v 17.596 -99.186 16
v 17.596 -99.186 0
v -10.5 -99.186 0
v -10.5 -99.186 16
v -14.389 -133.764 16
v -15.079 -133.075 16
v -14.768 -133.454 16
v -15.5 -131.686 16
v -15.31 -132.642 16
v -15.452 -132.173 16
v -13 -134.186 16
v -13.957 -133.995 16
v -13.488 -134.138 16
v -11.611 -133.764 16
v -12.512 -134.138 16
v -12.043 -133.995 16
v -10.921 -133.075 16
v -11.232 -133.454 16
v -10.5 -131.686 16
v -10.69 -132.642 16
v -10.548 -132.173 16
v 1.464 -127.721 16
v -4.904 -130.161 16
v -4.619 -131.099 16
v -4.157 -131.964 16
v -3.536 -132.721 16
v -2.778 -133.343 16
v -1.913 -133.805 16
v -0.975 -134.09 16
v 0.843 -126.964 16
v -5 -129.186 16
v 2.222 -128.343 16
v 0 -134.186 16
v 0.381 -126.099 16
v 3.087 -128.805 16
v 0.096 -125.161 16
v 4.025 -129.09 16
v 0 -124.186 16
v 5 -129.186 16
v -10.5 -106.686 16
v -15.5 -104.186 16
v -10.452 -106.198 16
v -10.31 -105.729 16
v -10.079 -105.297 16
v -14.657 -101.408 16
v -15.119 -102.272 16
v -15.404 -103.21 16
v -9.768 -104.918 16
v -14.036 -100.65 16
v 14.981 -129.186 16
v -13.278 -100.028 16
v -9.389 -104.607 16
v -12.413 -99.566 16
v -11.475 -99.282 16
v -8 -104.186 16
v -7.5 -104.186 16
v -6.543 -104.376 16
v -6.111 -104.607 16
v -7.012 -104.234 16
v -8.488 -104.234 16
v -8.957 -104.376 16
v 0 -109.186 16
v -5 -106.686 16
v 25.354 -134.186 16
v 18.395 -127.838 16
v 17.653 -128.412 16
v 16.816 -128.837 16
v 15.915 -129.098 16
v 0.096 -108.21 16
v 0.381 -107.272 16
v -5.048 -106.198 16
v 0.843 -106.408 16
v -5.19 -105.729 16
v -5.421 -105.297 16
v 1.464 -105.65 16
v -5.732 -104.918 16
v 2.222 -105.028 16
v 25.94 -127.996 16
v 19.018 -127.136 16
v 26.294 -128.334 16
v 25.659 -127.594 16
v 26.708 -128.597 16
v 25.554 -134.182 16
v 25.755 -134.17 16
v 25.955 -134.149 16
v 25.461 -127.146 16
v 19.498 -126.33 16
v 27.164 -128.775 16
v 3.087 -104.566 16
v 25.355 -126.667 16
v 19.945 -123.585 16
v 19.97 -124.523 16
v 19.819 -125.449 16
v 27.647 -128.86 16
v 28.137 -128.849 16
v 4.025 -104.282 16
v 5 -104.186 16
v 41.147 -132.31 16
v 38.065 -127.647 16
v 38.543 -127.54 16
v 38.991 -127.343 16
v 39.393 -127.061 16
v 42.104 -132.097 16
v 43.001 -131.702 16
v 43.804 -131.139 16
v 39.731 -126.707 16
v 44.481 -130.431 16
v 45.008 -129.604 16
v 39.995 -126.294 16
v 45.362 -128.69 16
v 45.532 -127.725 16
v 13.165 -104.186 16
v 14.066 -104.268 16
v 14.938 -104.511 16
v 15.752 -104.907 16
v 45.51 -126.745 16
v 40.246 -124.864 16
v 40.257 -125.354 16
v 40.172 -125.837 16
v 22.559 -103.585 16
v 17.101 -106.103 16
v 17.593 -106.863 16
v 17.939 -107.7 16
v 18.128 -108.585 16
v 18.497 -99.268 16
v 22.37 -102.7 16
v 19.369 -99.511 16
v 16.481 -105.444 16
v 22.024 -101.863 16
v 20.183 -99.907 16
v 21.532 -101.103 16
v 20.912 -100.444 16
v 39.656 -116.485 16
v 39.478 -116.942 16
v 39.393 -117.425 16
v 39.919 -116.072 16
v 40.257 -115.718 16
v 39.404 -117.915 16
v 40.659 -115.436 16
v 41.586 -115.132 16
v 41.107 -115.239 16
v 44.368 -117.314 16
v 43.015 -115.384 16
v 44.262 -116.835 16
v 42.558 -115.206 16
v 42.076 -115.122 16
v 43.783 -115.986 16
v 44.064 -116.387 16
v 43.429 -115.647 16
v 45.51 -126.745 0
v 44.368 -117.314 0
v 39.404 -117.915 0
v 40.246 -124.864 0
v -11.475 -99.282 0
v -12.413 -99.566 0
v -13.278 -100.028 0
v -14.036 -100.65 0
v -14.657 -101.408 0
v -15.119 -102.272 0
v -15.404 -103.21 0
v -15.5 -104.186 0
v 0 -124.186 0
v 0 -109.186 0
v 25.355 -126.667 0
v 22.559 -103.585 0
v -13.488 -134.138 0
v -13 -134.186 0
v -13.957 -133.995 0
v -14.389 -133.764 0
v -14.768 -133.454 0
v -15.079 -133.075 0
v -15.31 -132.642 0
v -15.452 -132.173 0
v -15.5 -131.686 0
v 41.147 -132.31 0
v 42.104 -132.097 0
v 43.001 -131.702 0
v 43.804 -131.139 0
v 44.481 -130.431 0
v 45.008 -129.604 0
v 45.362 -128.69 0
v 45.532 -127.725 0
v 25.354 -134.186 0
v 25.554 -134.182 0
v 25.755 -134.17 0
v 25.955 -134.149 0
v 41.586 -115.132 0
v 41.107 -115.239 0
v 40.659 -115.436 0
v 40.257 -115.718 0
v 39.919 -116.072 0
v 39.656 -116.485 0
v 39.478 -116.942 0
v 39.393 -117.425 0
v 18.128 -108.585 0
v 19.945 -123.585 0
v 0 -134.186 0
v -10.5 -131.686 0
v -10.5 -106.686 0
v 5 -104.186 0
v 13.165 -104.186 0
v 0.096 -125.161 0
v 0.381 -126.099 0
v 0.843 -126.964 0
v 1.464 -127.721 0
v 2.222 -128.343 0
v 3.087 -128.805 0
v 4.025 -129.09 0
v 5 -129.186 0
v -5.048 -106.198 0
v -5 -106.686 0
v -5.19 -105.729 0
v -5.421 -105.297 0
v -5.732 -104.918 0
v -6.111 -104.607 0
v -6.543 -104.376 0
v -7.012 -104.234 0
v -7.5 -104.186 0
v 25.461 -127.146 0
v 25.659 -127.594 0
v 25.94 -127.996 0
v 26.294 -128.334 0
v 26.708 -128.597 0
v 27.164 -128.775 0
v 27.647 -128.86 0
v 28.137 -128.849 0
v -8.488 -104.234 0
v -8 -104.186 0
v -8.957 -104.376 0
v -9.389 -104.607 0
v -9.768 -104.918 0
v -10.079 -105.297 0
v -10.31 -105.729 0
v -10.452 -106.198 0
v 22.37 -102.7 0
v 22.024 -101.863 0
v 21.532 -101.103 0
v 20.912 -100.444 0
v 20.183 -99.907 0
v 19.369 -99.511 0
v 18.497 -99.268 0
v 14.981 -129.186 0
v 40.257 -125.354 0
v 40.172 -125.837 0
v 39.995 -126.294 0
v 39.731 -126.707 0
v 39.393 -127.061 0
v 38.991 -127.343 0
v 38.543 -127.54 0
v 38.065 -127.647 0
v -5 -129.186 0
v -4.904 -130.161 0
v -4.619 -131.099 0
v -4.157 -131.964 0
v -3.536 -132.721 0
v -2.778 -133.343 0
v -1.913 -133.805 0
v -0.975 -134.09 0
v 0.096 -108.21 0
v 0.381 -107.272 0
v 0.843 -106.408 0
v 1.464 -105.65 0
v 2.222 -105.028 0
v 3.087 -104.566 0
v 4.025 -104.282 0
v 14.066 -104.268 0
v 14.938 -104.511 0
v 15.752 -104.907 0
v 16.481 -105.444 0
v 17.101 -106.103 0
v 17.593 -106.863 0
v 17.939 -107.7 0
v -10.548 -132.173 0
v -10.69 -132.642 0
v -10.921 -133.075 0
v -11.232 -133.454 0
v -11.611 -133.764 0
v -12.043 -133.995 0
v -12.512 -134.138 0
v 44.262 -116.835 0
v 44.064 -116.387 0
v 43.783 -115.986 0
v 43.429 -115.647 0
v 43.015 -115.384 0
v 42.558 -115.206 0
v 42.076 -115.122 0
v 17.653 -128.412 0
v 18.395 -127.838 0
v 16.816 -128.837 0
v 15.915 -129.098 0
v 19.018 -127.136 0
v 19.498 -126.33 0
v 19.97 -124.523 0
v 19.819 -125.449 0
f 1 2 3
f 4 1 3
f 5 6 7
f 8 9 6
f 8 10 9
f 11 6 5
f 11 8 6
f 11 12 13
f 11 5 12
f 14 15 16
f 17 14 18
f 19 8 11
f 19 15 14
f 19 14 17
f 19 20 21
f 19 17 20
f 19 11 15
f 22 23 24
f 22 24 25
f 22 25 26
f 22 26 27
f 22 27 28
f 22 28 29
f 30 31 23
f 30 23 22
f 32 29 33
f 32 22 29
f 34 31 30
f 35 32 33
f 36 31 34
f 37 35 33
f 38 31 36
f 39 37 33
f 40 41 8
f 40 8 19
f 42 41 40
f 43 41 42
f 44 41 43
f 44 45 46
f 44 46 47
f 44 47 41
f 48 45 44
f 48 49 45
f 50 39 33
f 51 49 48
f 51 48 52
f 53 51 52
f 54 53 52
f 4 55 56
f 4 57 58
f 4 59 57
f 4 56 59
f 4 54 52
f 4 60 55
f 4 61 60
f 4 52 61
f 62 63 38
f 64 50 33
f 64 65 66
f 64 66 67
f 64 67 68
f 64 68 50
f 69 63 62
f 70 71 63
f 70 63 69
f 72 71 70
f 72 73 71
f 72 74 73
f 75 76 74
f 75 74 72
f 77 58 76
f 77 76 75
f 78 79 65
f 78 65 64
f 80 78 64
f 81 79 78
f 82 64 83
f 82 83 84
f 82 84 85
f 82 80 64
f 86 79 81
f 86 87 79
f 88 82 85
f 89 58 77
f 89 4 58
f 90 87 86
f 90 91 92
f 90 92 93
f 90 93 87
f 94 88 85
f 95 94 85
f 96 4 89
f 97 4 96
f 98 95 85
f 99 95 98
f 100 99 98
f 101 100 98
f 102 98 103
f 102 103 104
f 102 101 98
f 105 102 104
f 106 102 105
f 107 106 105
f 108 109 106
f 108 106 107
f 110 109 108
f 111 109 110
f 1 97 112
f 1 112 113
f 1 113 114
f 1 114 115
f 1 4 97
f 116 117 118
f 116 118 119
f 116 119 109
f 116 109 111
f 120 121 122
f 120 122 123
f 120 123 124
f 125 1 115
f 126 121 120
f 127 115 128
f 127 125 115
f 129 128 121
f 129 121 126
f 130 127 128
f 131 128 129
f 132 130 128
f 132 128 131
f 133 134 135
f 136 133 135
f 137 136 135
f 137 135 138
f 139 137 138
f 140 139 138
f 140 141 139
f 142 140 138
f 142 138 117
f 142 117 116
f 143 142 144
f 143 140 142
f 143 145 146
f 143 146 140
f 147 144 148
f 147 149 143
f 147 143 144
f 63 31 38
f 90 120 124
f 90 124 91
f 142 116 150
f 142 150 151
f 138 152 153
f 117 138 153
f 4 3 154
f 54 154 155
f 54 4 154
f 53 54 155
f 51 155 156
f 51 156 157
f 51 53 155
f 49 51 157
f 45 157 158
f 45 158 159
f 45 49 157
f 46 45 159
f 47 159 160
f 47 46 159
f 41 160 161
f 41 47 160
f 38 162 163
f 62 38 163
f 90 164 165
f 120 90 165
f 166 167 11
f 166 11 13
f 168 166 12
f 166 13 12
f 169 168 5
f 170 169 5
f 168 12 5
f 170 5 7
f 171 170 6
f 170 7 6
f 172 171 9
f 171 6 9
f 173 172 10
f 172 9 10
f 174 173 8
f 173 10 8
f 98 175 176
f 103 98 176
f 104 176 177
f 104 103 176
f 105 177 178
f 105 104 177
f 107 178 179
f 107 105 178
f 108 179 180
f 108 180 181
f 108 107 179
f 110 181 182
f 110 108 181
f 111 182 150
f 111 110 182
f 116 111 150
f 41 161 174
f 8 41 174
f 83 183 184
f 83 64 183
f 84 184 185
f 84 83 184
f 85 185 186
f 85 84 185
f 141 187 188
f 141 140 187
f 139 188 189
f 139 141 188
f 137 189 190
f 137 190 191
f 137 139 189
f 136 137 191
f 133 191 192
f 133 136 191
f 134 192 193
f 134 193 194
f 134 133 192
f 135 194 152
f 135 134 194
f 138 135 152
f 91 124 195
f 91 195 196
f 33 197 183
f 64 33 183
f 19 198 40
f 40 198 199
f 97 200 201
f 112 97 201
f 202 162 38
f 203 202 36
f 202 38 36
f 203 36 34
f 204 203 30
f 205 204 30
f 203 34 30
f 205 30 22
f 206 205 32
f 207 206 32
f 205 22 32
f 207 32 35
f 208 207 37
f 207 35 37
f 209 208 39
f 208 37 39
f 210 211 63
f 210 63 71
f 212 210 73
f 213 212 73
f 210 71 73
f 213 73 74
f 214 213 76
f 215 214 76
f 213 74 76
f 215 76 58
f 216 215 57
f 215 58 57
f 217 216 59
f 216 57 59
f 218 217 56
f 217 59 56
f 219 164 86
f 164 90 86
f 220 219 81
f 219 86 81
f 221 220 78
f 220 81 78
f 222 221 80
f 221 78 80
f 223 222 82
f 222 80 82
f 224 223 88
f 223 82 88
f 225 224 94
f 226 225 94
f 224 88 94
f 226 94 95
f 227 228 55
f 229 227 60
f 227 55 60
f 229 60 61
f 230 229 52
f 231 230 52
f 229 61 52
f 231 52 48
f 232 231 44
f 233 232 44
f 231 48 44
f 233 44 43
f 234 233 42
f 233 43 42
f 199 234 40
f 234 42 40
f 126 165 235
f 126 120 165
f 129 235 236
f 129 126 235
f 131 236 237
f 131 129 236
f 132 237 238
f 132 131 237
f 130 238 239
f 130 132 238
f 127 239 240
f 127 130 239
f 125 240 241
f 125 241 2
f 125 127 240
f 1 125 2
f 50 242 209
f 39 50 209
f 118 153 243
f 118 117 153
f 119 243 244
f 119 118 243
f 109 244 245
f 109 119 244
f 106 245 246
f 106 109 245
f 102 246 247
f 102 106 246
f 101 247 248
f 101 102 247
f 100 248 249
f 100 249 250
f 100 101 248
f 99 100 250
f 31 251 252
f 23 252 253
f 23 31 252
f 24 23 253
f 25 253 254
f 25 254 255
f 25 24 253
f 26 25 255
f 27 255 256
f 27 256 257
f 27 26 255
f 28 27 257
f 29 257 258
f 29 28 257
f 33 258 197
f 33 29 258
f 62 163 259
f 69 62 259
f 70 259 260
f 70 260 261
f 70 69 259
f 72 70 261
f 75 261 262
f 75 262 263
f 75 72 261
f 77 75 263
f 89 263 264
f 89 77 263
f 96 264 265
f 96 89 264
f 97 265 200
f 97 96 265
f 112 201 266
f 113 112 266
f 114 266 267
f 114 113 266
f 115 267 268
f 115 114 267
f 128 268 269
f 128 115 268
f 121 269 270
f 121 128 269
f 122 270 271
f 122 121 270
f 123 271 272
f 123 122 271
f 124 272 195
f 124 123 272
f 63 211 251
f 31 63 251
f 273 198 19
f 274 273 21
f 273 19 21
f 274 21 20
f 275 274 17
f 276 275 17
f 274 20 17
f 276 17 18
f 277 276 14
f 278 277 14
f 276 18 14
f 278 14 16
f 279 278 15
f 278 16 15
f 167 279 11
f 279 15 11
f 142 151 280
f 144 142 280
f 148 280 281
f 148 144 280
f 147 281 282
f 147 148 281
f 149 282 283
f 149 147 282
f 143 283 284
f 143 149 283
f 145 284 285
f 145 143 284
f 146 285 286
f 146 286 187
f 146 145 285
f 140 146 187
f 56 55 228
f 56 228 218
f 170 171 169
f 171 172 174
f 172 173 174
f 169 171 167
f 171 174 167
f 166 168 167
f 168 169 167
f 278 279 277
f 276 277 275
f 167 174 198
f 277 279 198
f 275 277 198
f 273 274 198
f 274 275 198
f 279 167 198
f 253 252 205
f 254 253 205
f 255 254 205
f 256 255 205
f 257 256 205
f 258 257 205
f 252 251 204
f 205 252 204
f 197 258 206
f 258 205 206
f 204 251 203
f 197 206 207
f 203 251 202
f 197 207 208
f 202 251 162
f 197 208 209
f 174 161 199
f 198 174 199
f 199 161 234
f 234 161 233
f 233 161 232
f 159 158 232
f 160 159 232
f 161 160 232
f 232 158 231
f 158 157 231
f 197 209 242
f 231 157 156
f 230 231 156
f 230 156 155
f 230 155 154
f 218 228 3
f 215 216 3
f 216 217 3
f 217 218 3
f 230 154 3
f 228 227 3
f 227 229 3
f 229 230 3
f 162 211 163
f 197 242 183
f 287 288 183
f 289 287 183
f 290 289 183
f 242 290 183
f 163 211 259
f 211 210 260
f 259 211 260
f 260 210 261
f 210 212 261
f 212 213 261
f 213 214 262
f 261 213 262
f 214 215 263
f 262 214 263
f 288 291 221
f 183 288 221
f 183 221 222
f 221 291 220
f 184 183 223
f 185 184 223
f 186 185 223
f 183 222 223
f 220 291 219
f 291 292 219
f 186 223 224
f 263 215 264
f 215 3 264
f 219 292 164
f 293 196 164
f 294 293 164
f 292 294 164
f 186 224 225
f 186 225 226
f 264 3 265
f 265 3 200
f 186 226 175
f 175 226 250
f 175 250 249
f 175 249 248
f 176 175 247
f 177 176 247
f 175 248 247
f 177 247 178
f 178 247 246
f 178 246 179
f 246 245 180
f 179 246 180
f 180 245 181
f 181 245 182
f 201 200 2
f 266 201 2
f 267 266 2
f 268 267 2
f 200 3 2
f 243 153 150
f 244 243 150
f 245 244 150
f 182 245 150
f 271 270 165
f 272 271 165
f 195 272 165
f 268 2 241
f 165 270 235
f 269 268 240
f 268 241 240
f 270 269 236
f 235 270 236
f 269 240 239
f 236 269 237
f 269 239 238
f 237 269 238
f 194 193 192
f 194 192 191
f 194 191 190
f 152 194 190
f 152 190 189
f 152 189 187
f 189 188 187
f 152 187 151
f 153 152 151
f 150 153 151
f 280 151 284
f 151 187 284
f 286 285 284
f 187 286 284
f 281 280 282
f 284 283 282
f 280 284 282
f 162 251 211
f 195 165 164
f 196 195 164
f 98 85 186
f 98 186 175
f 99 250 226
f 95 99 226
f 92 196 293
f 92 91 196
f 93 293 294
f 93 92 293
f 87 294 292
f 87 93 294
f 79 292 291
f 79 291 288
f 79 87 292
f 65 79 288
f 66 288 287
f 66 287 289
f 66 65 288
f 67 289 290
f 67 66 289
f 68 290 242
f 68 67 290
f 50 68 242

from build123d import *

# Parameters (mm, degrees)
F0_W     = 5
F0_H     = 30
F1_DEPTH = 16
F2_R     = 5
F3_R     = 2.49999


# Not quite as in the source:
# - a fillet or chamfer is up to 0.001 mm smaller than in the source, because OpenCascade refuses the exact size
# - a feature names something its author has since deleted; it is built from what else it names


with BuildPart() as f1:
    # F0 (on Top) → F1 (new body)
    with BuildSketch(Plane.XY):
        with Locations((-13, -119.1857503612)):
            Rectangle(F0_W, F0_H)
        Polygon((-15.5, -99.1857503612), (-15.5, -104.1857503612), (-10.5, -104.1857503612), (-5, -104.1857503612), (0, -104.1857503612), (0, -99.1857503612), align=None)
        Polygon((0, -104.1857503612), (-5, -104.1857503612), (-5, -134.1857503612), (0, -134.1857503612), (0, -129.1857503612), align=None)
        Polygon((22.0267780379, -99.1857503612), (0, -99.1857503612), (0, -104.1857503612), (17.5957249839, -104.1857503612), (20.6230915981, -129.1857503612), (0, -129.1857503612), (0, -134.1857503612), (25.6551948256, -134.1857503612), (46.11123117, -131.7086335017), (44.067551515, -114.8319225227), (39.1038129917, -115.4330047742), (40.5464103953, -127.3459772299), (25.6551948256, -129.1492239844), align=None)
    extrude(amount=F1_DEPTH)

    # F2
    f2_edges = [f1.edges().sort_by_distance(p)[0] for p in [
        (-15.5, -99.18575, 8),
        (0, -104.18575, 8),
        (17.595725, -104.18575, 8),
        (20.623092, -129.18575, 8),
        (0, -129.18575, 8),
        (-5, -134.18575, 8),
        (22.026778, -99.18575, 8),
        (25.655195, -134.18575, 8),
        (46.111231, -131.708634, 8),
    ]]
    fillet(f2_edges, radius=F2_R)

    # F3 (radius 2.5 in the source; OpenCascade refuses exactly that, so slightly less here)
    f3_edges = [f1.edges().sort_by_distance(p)[0] for p in [
        (44.067552, -114.831923, 8),
        (39.103813, -115.433005, 8),
        (-15.5, -134.18575, 8),
        (-10.5, -134.18575, 8),
        (-10.5, -104.18575, 8),
        (-5, -104.18575, 8),
        (25.655195, -129.149224, 8),
        (40.54641, -127.345977, 8),
    ]]
    fillet(f3_edges, radius=F3_R)


solid = f1.part
